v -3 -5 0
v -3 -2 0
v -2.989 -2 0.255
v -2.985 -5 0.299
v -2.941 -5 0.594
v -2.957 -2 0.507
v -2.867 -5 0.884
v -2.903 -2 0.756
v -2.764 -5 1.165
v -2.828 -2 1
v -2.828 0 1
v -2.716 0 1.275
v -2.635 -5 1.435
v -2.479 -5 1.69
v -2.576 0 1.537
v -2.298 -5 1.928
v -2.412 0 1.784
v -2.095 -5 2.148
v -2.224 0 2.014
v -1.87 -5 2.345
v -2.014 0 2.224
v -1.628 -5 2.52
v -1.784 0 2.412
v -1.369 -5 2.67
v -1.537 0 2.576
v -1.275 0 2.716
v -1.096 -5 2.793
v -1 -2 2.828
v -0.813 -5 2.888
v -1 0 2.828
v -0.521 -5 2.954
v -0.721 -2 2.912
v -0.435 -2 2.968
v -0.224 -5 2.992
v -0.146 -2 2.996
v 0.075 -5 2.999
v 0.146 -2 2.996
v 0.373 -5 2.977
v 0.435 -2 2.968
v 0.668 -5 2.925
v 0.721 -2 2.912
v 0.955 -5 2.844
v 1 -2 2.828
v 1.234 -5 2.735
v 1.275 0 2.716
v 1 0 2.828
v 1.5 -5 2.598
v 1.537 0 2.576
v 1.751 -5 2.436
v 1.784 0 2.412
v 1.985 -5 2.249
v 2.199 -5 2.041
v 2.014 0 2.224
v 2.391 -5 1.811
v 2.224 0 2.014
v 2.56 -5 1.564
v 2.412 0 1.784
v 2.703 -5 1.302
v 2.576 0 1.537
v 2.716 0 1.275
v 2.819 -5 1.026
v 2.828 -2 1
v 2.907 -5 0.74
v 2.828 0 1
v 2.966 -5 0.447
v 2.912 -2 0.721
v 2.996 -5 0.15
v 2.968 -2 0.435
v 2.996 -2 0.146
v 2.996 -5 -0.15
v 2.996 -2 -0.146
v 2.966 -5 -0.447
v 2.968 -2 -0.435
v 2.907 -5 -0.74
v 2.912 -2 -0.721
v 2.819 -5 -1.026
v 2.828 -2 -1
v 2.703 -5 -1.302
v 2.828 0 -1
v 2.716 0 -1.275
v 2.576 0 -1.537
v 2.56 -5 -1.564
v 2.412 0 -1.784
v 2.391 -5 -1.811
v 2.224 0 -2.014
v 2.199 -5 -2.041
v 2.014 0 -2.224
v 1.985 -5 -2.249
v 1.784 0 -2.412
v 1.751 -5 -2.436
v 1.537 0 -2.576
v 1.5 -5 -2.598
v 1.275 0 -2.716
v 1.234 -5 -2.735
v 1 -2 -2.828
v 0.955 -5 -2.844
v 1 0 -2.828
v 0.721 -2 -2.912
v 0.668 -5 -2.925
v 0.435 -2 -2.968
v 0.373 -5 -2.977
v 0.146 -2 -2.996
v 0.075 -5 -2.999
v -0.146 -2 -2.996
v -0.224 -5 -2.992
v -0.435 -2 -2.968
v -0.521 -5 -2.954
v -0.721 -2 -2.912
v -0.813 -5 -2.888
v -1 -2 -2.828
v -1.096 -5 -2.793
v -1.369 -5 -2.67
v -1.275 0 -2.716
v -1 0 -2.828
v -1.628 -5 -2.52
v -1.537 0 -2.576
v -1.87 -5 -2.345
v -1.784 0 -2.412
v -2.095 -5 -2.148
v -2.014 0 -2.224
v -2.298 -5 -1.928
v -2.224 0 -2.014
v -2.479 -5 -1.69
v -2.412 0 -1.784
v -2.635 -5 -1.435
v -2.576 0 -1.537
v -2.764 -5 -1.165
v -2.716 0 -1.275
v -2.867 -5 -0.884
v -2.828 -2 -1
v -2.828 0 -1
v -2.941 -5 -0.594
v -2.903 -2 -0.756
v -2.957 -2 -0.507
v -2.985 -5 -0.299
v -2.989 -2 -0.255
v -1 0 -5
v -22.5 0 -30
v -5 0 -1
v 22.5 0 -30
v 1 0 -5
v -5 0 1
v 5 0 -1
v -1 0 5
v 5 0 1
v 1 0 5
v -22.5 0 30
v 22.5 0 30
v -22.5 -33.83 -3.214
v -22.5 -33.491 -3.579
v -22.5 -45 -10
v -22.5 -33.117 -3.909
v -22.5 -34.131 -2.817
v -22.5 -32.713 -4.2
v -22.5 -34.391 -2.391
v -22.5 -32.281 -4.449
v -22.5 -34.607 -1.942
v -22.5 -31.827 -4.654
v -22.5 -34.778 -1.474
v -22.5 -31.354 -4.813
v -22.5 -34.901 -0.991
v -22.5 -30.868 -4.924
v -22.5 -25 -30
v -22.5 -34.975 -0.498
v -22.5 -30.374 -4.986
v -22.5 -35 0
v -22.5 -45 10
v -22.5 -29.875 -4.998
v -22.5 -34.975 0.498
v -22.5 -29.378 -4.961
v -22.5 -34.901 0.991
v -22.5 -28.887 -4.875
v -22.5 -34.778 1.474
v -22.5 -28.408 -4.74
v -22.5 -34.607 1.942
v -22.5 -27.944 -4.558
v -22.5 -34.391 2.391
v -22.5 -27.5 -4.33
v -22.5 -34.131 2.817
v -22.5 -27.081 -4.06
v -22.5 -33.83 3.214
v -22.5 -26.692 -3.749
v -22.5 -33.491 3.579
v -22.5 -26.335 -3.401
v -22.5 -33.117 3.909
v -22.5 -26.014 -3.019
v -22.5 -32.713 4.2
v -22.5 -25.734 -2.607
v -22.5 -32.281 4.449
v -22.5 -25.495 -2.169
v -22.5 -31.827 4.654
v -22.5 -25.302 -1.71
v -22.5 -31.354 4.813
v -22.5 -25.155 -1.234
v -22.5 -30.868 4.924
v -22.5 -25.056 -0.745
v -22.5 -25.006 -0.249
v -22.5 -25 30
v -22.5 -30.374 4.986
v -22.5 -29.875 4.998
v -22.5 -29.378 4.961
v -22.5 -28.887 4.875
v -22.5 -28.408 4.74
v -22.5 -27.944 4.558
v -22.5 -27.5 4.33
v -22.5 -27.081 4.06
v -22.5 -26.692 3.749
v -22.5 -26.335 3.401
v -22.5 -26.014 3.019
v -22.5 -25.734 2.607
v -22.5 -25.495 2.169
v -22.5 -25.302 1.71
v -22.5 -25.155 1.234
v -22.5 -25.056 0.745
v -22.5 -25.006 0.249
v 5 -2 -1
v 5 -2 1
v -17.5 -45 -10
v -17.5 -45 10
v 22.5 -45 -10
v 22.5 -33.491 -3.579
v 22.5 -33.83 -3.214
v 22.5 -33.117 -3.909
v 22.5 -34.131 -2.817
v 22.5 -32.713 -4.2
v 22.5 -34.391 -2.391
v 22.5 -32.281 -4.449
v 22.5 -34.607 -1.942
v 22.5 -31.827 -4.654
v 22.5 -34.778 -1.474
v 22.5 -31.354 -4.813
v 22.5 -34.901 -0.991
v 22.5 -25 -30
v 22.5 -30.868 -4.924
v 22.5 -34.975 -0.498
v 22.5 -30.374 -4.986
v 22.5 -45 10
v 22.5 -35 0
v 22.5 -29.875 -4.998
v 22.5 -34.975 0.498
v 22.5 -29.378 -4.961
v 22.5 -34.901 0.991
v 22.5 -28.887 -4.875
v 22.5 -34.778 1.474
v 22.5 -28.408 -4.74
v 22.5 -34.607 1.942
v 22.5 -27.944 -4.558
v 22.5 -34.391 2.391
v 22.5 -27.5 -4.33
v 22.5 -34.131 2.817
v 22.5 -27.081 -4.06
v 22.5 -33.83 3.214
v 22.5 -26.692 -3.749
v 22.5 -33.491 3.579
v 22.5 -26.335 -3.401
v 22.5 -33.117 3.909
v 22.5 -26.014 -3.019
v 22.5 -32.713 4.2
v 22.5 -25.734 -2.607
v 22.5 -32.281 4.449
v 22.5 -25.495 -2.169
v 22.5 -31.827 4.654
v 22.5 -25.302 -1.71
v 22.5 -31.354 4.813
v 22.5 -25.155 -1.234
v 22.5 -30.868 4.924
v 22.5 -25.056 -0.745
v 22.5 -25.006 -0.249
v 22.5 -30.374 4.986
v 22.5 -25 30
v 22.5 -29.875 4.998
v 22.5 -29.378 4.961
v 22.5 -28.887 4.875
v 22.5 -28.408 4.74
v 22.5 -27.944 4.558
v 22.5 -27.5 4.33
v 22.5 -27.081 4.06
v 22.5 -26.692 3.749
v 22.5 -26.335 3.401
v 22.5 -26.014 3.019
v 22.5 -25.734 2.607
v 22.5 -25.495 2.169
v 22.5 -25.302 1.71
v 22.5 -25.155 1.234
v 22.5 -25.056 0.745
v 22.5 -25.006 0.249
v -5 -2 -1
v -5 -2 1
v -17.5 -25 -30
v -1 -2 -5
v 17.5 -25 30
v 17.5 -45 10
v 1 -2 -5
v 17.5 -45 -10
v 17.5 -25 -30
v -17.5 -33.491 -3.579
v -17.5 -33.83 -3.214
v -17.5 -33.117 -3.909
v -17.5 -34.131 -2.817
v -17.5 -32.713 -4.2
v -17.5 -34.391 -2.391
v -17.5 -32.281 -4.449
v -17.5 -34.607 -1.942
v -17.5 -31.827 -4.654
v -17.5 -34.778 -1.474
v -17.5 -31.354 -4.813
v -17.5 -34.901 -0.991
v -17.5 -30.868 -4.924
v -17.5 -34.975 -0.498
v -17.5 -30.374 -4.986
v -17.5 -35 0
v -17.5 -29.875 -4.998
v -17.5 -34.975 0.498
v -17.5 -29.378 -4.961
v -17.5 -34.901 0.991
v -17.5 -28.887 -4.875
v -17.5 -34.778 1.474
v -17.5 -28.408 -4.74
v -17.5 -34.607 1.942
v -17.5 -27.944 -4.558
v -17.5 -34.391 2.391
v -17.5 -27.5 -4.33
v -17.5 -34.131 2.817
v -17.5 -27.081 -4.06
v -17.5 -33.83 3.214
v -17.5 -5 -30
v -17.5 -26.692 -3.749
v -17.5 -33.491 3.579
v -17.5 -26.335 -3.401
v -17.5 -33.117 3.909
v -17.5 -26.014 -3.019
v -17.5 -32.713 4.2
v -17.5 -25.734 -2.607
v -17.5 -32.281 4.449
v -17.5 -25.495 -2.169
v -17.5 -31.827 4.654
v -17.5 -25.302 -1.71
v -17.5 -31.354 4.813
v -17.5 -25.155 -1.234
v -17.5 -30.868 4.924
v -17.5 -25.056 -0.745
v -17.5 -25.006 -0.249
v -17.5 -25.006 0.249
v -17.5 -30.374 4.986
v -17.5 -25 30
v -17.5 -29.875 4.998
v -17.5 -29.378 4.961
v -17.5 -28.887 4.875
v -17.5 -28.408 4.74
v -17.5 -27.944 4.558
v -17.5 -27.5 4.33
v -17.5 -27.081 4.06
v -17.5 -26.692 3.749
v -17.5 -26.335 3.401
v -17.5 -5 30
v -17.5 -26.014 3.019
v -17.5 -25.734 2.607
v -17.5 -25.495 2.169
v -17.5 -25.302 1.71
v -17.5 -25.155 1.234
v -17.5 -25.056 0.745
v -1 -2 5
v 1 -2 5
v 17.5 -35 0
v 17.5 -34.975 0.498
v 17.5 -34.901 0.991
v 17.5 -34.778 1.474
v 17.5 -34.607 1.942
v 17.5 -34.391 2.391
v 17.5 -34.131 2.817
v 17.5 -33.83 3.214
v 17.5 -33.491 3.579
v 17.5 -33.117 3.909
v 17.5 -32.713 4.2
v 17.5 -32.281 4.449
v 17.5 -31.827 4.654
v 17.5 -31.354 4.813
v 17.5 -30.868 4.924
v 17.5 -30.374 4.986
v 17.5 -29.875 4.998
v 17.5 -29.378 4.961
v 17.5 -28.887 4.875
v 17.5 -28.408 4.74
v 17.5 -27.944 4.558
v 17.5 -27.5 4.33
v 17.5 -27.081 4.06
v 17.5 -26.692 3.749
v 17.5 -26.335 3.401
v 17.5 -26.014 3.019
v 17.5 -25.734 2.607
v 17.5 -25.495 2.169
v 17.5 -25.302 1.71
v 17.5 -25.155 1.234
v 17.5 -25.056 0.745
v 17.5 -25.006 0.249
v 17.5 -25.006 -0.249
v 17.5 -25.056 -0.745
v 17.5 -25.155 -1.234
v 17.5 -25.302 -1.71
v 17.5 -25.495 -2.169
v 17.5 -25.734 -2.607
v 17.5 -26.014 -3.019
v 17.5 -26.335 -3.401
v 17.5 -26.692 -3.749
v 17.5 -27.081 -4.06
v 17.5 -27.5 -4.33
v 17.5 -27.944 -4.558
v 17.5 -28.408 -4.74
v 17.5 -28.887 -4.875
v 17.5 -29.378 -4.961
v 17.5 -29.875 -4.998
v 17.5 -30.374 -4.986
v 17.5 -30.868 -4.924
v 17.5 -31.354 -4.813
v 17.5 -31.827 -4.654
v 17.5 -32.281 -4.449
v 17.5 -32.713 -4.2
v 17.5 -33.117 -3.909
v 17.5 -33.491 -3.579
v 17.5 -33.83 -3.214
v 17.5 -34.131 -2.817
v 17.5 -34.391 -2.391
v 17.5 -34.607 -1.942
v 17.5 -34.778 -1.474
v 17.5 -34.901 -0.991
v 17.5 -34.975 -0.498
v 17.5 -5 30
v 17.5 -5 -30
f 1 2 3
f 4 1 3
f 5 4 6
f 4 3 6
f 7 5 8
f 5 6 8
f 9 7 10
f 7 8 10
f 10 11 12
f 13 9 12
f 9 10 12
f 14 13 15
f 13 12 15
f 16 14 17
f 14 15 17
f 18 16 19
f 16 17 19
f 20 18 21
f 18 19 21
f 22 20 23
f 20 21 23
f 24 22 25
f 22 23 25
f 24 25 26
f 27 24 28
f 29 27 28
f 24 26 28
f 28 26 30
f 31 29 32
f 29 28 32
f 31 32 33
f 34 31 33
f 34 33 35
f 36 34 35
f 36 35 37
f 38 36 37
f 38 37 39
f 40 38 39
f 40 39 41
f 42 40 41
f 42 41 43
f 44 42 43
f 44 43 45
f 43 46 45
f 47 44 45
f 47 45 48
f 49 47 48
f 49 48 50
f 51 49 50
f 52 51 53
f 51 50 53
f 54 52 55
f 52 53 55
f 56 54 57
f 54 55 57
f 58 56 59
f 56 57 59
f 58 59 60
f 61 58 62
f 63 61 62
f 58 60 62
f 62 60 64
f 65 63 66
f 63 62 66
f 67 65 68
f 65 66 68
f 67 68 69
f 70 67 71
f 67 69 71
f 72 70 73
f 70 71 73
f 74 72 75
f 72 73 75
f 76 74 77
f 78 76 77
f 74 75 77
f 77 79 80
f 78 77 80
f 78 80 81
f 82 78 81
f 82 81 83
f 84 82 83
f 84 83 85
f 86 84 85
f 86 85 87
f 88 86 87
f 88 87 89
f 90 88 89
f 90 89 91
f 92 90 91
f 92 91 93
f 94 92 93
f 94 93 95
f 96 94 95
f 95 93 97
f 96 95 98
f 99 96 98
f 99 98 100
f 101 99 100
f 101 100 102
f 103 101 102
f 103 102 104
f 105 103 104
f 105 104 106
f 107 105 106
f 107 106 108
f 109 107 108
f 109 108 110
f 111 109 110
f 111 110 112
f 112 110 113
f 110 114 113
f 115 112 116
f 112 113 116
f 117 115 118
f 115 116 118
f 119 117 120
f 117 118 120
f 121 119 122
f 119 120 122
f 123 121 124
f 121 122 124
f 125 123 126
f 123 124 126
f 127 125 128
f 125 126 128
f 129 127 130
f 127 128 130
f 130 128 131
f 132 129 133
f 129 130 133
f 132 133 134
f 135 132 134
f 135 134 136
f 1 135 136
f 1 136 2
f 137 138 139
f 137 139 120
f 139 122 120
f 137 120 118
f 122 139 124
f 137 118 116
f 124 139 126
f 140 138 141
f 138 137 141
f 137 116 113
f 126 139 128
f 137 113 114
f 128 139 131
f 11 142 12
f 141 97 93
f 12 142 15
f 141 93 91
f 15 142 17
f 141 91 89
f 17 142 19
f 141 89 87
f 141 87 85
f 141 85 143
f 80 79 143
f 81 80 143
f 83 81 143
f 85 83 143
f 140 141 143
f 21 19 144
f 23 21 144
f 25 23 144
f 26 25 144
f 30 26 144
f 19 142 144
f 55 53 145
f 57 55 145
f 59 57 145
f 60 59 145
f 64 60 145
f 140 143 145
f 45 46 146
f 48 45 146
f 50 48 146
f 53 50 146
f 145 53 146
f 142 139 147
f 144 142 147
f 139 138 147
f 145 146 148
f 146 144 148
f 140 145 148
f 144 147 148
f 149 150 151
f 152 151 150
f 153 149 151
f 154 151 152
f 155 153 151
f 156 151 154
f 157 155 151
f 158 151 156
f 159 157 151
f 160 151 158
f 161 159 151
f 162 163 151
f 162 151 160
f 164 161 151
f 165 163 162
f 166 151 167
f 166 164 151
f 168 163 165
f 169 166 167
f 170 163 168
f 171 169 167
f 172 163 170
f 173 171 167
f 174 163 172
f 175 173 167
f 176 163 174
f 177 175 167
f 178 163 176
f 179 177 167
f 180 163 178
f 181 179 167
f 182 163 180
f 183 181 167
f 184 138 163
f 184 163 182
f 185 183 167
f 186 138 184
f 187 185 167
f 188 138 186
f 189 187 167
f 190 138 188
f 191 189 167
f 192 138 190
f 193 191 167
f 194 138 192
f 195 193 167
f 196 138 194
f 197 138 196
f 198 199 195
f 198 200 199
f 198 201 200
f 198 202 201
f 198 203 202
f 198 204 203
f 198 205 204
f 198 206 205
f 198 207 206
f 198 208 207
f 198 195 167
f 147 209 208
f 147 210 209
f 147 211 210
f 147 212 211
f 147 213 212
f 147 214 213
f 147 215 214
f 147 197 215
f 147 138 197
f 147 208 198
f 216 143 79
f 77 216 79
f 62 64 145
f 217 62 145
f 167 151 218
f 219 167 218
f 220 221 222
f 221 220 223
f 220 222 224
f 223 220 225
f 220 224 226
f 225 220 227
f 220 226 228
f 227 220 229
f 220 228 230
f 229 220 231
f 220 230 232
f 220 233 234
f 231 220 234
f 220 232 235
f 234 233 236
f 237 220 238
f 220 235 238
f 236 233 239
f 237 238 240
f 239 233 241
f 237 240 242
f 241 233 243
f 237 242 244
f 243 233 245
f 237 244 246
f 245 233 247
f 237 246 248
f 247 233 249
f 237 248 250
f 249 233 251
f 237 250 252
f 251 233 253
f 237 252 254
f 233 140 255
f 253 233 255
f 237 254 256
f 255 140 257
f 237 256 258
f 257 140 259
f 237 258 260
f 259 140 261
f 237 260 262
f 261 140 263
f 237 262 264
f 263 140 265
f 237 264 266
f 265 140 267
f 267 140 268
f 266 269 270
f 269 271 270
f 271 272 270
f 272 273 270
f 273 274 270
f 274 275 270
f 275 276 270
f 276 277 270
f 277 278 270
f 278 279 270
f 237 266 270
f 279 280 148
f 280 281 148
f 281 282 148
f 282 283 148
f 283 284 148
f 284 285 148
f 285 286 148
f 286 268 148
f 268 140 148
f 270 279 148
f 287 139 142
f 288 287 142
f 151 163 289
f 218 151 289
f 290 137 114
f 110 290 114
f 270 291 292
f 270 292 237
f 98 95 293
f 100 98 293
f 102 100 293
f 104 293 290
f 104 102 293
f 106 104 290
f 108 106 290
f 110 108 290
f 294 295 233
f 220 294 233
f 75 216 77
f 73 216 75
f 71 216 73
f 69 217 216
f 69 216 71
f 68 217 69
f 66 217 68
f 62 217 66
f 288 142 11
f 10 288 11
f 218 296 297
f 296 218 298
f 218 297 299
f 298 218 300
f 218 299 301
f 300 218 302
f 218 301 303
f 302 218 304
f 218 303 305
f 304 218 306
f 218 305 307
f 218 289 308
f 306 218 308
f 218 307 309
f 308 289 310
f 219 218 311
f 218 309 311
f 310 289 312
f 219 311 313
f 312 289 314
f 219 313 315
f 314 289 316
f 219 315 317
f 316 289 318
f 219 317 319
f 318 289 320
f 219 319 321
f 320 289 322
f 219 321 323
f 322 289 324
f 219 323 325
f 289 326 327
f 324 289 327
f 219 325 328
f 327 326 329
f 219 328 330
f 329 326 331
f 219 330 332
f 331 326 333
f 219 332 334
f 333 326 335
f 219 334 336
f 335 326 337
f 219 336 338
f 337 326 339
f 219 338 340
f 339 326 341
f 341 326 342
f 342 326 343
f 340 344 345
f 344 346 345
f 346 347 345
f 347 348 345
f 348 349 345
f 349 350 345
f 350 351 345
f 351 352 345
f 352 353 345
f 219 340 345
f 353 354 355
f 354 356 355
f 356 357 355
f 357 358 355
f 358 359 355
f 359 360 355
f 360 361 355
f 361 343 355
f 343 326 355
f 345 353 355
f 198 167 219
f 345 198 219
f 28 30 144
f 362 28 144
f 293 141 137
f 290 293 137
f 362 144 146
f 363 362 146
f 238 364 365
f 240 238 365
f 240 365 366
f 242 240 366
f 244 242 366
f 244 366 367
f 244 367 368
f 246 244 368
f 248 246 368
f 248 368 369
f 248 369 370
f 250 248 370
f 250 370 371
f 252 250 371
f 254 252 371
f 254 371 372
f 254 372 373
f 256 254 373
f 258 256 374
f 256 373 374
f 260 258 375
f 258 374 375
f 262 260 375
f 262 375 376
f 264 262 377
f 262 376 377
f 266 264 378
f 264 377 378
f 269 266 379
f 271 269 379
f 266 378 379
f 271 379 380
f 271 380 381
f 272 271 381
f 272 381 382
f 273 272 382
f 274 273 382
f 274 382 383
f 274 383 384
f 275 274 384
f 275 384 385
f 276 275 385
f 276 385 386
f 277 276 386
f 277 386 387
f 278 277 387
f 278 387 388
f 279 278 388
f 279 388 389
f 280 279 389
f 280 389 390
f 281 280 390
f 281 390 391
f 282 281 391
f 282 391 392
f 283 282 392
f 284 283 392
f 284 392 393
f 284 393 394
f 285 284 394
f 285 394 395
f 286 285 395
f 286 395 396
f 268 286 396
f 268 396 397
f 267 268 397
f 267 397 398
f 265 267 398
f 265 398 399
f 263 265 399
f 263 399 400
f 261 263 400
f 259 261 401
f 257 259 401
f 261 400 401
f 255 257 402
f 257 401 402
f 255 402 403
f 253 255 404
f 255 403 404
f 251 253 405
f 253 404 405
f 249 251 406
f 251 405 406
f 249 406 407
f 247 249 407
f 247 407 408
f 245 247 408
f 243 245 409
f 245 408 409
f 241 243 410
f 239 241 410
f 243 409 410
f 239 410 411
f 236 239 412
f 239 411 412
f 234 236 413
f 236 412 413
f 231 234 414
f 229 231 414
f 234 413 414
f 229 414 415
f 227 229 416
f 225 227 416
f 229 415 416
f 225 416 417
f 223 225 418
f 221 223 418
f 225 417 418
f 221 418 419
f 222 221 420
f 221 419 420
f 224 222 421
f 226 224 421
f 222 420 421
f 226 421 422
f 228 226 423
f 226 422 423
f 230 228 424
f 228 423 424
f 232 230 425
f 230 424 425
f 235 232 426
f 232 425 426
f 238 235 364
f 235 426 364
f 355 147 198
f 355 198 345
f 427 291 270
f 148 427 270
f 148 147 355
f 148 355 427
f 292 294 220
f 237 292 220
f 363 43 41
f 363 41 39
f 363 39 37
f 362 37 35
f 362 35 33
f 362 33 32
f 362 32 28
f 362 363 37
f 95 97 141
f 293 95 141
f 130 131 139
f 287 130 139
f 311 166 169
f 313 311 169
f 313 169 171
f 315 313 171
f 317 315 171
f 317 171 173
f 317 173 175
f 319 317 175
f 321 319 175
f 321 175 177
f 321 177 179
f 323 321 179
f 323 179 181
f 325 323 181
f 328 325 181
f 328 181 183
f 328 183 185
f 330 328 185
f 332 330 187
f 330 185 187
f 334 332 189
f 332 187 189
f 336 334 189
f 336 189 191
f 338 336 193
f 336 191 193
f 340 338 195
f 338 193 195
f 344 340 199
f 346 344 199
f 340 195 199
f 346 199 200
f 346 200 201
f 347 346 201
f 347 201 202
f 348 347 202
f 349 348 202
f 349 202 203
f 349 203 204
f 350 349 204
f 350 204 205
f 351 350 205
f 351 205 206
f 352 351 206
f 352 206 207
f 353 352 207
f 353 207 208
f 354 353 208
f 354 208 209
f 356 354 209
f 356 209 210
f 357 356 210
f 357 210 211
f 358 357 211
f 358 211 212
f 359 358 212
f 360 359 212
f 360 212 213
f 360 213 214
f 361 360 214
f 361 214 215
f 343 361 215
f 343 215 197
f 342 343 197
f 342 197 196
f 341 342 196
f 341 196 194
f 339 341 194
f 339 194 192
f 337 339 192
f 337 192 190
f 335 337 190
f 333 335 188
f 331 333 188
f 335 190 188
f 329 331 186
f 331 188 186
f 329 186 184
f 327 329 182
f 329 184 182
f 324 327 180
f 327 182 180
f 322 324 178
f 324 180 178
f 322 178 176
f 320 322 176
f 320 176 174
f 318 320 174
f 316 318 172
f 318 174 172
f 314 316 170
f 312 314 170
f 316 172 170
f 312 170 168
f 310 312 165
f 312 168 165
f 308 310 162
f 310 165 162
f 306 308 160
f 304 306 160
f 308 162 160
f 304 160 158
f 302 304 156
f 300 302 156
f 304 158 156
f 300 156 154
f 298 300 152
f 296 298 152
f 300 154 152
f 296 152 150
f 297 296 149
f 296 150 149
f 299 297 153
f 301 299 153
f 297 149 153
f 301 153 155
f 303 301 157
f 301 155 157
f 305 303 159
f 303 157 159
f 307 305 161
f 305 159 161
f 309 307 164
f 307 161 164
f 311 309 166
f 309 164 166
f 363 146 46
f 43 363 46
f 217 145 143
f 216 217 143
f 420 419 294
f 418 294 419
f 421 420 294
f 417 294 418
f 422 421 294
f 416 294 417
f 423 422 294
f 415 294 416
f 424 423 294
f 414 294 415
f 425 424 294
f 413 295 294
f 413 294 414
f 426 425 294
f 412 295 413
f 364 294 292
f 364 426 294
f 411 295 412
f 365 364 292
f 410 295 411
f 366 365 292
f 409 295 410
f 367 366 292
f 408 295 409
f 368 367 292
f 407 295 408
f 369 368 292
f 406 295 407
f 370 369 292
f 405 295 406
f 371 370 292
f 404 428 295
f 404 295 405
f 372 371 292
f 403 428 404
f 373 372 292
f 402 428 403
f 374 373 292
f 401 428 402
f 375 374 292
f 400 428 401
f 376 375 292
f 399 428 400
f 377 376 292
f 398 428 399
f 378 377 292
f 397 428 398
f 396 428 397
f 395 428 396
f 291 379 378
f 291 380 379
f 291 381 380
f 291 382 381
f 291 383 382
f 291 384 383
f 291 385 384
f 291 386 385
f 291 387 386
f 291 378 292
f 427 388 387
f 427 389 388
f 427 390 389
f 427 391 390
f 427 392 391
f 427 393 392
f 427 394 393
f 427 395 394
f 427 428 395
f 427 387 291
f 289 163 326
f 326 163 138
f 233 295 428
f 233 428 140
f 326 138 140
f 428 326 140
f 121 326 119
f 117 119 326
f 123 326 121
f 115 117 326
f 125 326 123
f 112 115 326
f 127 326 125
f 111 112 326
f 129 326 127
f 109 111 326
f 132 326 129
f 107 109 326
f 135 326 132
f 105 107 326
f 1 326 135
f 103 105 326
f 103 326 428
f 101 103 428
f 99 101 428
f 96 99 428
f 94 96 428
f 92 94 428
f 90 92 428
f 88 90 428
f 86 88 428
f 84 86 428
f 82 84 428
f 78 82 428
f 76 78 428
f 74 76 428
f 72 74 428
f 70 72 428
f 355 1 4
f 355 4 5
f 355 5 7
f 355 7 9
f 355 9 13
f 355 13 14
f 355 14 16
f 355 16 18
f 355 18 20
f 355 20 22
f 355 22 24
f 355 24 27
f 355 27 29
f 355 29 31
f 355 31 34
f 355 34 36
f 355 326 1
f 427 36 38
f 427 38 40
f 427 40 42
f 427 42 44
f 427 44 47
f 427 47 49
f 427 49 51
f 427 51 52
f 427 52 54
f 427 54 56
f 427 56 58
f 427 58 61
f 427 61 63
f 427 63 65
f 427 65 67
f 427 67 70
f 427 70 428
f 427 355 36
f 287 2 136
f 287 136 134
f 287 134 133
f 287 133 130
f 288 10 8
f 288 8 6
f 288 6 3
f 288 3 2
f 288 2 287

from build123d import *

# Parameters (mm, degrees)
F0_W      = 45
F0_H      = 60
F1_DEPTH  = 5
F2_W      = 5
F2_H      = 60
F3_DEPTH  = 40
F4_SIZE2  = 20
F4_SIZE   = 20
F5_R      = 5
F6_DEPTH  = 50
F8_D      = 6
F8_DEPTH  = 20
F8_TIP    = 1.8025818571
F10_DEPTH = 2
F11_DEPTH = 2


# Not quite as in the source:
# - after a boolean that leaves OpenCascade's solid faulty, fix() repairs it


with BuildPart() as f1:
    # F0 (on Front) → F1 (new body)
    with BuildSketch(Plane.XZ):
        Rectangle(F0_W, F0_H)
    extrude(amount=F1_DEPTH)

    # F2 (on face) → F3 (join)
    with BuildSketch(Plane.XZ.offset(5)):
        with Locations((-20, 0)):
            Rectangle(F2_W, F2_H)
        with Locations((20, 0)):
            Rectangle(F2_W, F2_H)
    extrude(amount=F3_DEPTH)

    # F4
    f4_edges = [f1.edges().sort_by_distance(p)[0] for p in [
        (20, -45, 30),
        (-20, -45, 30),
        (20, -45, -30),
        (-20, -45, -30),
    ]]
    chamfer(f4_edges, length=F4_SIZE, length2=F4_SIZE2)

    # F5 (on face) → F6 (cut)
    with BuildSketch(Plane(origin=(-22.5, 0, 0), x_dir=(0, -1, 0), z_dir=(-1, 0, 0))):
        with Locations((30, 0)):
            Circle(F5_R)
    extrude(amount=-F6_DEPTH, mode=Mode.SUBTRACT)

    # F8
    with Locations(Plane.XZ.offset(5)):
        with Locations((0, 0)):
            Hole(F8_D / 2, depth=F8_DEPTH)
            with Locations((0, 0, -(F8_DEPTH + F8_TIP / 2))):  # 118° drill point
                Cone(0, F8_D / 2, F8_TIP, mode=Mode.SUBTRACT)

    # F9 (on face) → F10 (cut)
    with BuildSketch(Plane(origin=(0, 0, 0), x_dir=(-1, 0, 0), z_dir=(0, 1, 0))):
        with BuildLine():
            Line((-5, -1), (-3.7431358354, -1))
            ThreePointArc((-3.7431358354, -1), (-3.8701524892, 0), (-3.7431358354, 1))
            Line((-3.7431358354, 1), (-5, 1))
            Line((-5, 1), (-5, -1))
        make_face()
        with BuildLine():
            ThreePointArc((-1, 3.8371140982), (-0.0042634526, 3.997751149), (1, 3.9042073005))
            Line((1, 3.9042073005), (1, 5))
            Line((1, 5), (-1, 5))
            Line((-1, 5), (-1, 3.8371140982))
        make_face()
        with BuildLine():
            Line((4.002830857, -1), (5, -1))
            Line((5, -1), (5, 1))
            Line((5, 1), (4.002830857, 1))
            ThreePointArc((4.002830857, 1), (4.0979662959, 0.5040171699), (4.1298475108, 0))
            ThreePointArc((4.1298475108, 0), (4.0979662959, -0.5040171699), (4.002830857, -1))
        make_face()
        with BuildLine():
            Line((1, -5), (1, -3.9042073005))
            ThreePointArc((1, -3.9042073005), (-0.0042634526, -3.997751149), (-1, -3.8371140982))
            Line((-1, -3.8371140982), (-1, -5))
            Line((-1, -5), (1, -5))
        make_face()
    extrude(amount=-F10_DEPTH, mode=Mode.SUBTRACT)

    # F9 (on face) → F11 (cut)
    with BuildSketch(Plane(origin=(0, 0, 0), x_dir=(-1, 0, 0), z_dir=(0, 1, 0))):
        with BuildLine():
            Line((2.8284271247, -1), (4.002830857, -1))
            ThreePointArc((4.002830857, -1), (4.0979662959, -0.5040171699), (4.1298475108, 0))
            ThreePointArc((4.1298475108, 0), (4.0979662959, 0.5040171699), (4.002830857, 1))
            Line((4.002830857, 1), (2.8284271247, 1))
            ThreePointArc((2.8284271247, 1), (2.956795679, 0.5073059362), (3, 0))
            ThreePointArc((3, 0), (2.956795679, -0.5073059362), (2.8284271247, -1))
        make_face()
        with BuildLine():
            ThreePointArc((-3.7431358354, 1), (-3.8701524892, 0), (-3.7431358354, -1))
            Line((-3.7431358354, -1), (-2.8284271247, -1))
            ThreePointArc((-2.8284271247, -1), (-3, 0), (-2.8284271247, 1))
            Line((-2.8284271247, 1), (-3.7431358354, 1))
        make_face()
        with BuildLine():
            Line((1, 2.8284271247), (1, 3.9042073005))
            ThreePointArc((1, 3.9042073005), (-0.0042634526, 3.997751149), (-1, 3.8371140982))
            Line((-1, 3.8371140982), (-1, 2.8284271247))
            ThreePointArc((-1, 2.8284271247), (0, 3), (1, 2.8284271247))
        make_face()
        with BuildLine():
            ThreePointArc((-1, -3.8371140982), (-0.0042634526, -3.997751149), (1, -3.9042073005))
            Line((1, -3.9042073005), (1, -2.8284271247))
            ThreePointArc((1, -2.8284271247), (0, -3), (-1, -2.8284271247))
            Line((-1, -2.8284271247), (-1, -3.8371140982))
        make_face()
    extrude(amount=-F11_DEPTH, mode=Mode.SUBTRACT)

    add(f1.part.fix(), mode=Mode.REPLACE)


solid = f1.part
